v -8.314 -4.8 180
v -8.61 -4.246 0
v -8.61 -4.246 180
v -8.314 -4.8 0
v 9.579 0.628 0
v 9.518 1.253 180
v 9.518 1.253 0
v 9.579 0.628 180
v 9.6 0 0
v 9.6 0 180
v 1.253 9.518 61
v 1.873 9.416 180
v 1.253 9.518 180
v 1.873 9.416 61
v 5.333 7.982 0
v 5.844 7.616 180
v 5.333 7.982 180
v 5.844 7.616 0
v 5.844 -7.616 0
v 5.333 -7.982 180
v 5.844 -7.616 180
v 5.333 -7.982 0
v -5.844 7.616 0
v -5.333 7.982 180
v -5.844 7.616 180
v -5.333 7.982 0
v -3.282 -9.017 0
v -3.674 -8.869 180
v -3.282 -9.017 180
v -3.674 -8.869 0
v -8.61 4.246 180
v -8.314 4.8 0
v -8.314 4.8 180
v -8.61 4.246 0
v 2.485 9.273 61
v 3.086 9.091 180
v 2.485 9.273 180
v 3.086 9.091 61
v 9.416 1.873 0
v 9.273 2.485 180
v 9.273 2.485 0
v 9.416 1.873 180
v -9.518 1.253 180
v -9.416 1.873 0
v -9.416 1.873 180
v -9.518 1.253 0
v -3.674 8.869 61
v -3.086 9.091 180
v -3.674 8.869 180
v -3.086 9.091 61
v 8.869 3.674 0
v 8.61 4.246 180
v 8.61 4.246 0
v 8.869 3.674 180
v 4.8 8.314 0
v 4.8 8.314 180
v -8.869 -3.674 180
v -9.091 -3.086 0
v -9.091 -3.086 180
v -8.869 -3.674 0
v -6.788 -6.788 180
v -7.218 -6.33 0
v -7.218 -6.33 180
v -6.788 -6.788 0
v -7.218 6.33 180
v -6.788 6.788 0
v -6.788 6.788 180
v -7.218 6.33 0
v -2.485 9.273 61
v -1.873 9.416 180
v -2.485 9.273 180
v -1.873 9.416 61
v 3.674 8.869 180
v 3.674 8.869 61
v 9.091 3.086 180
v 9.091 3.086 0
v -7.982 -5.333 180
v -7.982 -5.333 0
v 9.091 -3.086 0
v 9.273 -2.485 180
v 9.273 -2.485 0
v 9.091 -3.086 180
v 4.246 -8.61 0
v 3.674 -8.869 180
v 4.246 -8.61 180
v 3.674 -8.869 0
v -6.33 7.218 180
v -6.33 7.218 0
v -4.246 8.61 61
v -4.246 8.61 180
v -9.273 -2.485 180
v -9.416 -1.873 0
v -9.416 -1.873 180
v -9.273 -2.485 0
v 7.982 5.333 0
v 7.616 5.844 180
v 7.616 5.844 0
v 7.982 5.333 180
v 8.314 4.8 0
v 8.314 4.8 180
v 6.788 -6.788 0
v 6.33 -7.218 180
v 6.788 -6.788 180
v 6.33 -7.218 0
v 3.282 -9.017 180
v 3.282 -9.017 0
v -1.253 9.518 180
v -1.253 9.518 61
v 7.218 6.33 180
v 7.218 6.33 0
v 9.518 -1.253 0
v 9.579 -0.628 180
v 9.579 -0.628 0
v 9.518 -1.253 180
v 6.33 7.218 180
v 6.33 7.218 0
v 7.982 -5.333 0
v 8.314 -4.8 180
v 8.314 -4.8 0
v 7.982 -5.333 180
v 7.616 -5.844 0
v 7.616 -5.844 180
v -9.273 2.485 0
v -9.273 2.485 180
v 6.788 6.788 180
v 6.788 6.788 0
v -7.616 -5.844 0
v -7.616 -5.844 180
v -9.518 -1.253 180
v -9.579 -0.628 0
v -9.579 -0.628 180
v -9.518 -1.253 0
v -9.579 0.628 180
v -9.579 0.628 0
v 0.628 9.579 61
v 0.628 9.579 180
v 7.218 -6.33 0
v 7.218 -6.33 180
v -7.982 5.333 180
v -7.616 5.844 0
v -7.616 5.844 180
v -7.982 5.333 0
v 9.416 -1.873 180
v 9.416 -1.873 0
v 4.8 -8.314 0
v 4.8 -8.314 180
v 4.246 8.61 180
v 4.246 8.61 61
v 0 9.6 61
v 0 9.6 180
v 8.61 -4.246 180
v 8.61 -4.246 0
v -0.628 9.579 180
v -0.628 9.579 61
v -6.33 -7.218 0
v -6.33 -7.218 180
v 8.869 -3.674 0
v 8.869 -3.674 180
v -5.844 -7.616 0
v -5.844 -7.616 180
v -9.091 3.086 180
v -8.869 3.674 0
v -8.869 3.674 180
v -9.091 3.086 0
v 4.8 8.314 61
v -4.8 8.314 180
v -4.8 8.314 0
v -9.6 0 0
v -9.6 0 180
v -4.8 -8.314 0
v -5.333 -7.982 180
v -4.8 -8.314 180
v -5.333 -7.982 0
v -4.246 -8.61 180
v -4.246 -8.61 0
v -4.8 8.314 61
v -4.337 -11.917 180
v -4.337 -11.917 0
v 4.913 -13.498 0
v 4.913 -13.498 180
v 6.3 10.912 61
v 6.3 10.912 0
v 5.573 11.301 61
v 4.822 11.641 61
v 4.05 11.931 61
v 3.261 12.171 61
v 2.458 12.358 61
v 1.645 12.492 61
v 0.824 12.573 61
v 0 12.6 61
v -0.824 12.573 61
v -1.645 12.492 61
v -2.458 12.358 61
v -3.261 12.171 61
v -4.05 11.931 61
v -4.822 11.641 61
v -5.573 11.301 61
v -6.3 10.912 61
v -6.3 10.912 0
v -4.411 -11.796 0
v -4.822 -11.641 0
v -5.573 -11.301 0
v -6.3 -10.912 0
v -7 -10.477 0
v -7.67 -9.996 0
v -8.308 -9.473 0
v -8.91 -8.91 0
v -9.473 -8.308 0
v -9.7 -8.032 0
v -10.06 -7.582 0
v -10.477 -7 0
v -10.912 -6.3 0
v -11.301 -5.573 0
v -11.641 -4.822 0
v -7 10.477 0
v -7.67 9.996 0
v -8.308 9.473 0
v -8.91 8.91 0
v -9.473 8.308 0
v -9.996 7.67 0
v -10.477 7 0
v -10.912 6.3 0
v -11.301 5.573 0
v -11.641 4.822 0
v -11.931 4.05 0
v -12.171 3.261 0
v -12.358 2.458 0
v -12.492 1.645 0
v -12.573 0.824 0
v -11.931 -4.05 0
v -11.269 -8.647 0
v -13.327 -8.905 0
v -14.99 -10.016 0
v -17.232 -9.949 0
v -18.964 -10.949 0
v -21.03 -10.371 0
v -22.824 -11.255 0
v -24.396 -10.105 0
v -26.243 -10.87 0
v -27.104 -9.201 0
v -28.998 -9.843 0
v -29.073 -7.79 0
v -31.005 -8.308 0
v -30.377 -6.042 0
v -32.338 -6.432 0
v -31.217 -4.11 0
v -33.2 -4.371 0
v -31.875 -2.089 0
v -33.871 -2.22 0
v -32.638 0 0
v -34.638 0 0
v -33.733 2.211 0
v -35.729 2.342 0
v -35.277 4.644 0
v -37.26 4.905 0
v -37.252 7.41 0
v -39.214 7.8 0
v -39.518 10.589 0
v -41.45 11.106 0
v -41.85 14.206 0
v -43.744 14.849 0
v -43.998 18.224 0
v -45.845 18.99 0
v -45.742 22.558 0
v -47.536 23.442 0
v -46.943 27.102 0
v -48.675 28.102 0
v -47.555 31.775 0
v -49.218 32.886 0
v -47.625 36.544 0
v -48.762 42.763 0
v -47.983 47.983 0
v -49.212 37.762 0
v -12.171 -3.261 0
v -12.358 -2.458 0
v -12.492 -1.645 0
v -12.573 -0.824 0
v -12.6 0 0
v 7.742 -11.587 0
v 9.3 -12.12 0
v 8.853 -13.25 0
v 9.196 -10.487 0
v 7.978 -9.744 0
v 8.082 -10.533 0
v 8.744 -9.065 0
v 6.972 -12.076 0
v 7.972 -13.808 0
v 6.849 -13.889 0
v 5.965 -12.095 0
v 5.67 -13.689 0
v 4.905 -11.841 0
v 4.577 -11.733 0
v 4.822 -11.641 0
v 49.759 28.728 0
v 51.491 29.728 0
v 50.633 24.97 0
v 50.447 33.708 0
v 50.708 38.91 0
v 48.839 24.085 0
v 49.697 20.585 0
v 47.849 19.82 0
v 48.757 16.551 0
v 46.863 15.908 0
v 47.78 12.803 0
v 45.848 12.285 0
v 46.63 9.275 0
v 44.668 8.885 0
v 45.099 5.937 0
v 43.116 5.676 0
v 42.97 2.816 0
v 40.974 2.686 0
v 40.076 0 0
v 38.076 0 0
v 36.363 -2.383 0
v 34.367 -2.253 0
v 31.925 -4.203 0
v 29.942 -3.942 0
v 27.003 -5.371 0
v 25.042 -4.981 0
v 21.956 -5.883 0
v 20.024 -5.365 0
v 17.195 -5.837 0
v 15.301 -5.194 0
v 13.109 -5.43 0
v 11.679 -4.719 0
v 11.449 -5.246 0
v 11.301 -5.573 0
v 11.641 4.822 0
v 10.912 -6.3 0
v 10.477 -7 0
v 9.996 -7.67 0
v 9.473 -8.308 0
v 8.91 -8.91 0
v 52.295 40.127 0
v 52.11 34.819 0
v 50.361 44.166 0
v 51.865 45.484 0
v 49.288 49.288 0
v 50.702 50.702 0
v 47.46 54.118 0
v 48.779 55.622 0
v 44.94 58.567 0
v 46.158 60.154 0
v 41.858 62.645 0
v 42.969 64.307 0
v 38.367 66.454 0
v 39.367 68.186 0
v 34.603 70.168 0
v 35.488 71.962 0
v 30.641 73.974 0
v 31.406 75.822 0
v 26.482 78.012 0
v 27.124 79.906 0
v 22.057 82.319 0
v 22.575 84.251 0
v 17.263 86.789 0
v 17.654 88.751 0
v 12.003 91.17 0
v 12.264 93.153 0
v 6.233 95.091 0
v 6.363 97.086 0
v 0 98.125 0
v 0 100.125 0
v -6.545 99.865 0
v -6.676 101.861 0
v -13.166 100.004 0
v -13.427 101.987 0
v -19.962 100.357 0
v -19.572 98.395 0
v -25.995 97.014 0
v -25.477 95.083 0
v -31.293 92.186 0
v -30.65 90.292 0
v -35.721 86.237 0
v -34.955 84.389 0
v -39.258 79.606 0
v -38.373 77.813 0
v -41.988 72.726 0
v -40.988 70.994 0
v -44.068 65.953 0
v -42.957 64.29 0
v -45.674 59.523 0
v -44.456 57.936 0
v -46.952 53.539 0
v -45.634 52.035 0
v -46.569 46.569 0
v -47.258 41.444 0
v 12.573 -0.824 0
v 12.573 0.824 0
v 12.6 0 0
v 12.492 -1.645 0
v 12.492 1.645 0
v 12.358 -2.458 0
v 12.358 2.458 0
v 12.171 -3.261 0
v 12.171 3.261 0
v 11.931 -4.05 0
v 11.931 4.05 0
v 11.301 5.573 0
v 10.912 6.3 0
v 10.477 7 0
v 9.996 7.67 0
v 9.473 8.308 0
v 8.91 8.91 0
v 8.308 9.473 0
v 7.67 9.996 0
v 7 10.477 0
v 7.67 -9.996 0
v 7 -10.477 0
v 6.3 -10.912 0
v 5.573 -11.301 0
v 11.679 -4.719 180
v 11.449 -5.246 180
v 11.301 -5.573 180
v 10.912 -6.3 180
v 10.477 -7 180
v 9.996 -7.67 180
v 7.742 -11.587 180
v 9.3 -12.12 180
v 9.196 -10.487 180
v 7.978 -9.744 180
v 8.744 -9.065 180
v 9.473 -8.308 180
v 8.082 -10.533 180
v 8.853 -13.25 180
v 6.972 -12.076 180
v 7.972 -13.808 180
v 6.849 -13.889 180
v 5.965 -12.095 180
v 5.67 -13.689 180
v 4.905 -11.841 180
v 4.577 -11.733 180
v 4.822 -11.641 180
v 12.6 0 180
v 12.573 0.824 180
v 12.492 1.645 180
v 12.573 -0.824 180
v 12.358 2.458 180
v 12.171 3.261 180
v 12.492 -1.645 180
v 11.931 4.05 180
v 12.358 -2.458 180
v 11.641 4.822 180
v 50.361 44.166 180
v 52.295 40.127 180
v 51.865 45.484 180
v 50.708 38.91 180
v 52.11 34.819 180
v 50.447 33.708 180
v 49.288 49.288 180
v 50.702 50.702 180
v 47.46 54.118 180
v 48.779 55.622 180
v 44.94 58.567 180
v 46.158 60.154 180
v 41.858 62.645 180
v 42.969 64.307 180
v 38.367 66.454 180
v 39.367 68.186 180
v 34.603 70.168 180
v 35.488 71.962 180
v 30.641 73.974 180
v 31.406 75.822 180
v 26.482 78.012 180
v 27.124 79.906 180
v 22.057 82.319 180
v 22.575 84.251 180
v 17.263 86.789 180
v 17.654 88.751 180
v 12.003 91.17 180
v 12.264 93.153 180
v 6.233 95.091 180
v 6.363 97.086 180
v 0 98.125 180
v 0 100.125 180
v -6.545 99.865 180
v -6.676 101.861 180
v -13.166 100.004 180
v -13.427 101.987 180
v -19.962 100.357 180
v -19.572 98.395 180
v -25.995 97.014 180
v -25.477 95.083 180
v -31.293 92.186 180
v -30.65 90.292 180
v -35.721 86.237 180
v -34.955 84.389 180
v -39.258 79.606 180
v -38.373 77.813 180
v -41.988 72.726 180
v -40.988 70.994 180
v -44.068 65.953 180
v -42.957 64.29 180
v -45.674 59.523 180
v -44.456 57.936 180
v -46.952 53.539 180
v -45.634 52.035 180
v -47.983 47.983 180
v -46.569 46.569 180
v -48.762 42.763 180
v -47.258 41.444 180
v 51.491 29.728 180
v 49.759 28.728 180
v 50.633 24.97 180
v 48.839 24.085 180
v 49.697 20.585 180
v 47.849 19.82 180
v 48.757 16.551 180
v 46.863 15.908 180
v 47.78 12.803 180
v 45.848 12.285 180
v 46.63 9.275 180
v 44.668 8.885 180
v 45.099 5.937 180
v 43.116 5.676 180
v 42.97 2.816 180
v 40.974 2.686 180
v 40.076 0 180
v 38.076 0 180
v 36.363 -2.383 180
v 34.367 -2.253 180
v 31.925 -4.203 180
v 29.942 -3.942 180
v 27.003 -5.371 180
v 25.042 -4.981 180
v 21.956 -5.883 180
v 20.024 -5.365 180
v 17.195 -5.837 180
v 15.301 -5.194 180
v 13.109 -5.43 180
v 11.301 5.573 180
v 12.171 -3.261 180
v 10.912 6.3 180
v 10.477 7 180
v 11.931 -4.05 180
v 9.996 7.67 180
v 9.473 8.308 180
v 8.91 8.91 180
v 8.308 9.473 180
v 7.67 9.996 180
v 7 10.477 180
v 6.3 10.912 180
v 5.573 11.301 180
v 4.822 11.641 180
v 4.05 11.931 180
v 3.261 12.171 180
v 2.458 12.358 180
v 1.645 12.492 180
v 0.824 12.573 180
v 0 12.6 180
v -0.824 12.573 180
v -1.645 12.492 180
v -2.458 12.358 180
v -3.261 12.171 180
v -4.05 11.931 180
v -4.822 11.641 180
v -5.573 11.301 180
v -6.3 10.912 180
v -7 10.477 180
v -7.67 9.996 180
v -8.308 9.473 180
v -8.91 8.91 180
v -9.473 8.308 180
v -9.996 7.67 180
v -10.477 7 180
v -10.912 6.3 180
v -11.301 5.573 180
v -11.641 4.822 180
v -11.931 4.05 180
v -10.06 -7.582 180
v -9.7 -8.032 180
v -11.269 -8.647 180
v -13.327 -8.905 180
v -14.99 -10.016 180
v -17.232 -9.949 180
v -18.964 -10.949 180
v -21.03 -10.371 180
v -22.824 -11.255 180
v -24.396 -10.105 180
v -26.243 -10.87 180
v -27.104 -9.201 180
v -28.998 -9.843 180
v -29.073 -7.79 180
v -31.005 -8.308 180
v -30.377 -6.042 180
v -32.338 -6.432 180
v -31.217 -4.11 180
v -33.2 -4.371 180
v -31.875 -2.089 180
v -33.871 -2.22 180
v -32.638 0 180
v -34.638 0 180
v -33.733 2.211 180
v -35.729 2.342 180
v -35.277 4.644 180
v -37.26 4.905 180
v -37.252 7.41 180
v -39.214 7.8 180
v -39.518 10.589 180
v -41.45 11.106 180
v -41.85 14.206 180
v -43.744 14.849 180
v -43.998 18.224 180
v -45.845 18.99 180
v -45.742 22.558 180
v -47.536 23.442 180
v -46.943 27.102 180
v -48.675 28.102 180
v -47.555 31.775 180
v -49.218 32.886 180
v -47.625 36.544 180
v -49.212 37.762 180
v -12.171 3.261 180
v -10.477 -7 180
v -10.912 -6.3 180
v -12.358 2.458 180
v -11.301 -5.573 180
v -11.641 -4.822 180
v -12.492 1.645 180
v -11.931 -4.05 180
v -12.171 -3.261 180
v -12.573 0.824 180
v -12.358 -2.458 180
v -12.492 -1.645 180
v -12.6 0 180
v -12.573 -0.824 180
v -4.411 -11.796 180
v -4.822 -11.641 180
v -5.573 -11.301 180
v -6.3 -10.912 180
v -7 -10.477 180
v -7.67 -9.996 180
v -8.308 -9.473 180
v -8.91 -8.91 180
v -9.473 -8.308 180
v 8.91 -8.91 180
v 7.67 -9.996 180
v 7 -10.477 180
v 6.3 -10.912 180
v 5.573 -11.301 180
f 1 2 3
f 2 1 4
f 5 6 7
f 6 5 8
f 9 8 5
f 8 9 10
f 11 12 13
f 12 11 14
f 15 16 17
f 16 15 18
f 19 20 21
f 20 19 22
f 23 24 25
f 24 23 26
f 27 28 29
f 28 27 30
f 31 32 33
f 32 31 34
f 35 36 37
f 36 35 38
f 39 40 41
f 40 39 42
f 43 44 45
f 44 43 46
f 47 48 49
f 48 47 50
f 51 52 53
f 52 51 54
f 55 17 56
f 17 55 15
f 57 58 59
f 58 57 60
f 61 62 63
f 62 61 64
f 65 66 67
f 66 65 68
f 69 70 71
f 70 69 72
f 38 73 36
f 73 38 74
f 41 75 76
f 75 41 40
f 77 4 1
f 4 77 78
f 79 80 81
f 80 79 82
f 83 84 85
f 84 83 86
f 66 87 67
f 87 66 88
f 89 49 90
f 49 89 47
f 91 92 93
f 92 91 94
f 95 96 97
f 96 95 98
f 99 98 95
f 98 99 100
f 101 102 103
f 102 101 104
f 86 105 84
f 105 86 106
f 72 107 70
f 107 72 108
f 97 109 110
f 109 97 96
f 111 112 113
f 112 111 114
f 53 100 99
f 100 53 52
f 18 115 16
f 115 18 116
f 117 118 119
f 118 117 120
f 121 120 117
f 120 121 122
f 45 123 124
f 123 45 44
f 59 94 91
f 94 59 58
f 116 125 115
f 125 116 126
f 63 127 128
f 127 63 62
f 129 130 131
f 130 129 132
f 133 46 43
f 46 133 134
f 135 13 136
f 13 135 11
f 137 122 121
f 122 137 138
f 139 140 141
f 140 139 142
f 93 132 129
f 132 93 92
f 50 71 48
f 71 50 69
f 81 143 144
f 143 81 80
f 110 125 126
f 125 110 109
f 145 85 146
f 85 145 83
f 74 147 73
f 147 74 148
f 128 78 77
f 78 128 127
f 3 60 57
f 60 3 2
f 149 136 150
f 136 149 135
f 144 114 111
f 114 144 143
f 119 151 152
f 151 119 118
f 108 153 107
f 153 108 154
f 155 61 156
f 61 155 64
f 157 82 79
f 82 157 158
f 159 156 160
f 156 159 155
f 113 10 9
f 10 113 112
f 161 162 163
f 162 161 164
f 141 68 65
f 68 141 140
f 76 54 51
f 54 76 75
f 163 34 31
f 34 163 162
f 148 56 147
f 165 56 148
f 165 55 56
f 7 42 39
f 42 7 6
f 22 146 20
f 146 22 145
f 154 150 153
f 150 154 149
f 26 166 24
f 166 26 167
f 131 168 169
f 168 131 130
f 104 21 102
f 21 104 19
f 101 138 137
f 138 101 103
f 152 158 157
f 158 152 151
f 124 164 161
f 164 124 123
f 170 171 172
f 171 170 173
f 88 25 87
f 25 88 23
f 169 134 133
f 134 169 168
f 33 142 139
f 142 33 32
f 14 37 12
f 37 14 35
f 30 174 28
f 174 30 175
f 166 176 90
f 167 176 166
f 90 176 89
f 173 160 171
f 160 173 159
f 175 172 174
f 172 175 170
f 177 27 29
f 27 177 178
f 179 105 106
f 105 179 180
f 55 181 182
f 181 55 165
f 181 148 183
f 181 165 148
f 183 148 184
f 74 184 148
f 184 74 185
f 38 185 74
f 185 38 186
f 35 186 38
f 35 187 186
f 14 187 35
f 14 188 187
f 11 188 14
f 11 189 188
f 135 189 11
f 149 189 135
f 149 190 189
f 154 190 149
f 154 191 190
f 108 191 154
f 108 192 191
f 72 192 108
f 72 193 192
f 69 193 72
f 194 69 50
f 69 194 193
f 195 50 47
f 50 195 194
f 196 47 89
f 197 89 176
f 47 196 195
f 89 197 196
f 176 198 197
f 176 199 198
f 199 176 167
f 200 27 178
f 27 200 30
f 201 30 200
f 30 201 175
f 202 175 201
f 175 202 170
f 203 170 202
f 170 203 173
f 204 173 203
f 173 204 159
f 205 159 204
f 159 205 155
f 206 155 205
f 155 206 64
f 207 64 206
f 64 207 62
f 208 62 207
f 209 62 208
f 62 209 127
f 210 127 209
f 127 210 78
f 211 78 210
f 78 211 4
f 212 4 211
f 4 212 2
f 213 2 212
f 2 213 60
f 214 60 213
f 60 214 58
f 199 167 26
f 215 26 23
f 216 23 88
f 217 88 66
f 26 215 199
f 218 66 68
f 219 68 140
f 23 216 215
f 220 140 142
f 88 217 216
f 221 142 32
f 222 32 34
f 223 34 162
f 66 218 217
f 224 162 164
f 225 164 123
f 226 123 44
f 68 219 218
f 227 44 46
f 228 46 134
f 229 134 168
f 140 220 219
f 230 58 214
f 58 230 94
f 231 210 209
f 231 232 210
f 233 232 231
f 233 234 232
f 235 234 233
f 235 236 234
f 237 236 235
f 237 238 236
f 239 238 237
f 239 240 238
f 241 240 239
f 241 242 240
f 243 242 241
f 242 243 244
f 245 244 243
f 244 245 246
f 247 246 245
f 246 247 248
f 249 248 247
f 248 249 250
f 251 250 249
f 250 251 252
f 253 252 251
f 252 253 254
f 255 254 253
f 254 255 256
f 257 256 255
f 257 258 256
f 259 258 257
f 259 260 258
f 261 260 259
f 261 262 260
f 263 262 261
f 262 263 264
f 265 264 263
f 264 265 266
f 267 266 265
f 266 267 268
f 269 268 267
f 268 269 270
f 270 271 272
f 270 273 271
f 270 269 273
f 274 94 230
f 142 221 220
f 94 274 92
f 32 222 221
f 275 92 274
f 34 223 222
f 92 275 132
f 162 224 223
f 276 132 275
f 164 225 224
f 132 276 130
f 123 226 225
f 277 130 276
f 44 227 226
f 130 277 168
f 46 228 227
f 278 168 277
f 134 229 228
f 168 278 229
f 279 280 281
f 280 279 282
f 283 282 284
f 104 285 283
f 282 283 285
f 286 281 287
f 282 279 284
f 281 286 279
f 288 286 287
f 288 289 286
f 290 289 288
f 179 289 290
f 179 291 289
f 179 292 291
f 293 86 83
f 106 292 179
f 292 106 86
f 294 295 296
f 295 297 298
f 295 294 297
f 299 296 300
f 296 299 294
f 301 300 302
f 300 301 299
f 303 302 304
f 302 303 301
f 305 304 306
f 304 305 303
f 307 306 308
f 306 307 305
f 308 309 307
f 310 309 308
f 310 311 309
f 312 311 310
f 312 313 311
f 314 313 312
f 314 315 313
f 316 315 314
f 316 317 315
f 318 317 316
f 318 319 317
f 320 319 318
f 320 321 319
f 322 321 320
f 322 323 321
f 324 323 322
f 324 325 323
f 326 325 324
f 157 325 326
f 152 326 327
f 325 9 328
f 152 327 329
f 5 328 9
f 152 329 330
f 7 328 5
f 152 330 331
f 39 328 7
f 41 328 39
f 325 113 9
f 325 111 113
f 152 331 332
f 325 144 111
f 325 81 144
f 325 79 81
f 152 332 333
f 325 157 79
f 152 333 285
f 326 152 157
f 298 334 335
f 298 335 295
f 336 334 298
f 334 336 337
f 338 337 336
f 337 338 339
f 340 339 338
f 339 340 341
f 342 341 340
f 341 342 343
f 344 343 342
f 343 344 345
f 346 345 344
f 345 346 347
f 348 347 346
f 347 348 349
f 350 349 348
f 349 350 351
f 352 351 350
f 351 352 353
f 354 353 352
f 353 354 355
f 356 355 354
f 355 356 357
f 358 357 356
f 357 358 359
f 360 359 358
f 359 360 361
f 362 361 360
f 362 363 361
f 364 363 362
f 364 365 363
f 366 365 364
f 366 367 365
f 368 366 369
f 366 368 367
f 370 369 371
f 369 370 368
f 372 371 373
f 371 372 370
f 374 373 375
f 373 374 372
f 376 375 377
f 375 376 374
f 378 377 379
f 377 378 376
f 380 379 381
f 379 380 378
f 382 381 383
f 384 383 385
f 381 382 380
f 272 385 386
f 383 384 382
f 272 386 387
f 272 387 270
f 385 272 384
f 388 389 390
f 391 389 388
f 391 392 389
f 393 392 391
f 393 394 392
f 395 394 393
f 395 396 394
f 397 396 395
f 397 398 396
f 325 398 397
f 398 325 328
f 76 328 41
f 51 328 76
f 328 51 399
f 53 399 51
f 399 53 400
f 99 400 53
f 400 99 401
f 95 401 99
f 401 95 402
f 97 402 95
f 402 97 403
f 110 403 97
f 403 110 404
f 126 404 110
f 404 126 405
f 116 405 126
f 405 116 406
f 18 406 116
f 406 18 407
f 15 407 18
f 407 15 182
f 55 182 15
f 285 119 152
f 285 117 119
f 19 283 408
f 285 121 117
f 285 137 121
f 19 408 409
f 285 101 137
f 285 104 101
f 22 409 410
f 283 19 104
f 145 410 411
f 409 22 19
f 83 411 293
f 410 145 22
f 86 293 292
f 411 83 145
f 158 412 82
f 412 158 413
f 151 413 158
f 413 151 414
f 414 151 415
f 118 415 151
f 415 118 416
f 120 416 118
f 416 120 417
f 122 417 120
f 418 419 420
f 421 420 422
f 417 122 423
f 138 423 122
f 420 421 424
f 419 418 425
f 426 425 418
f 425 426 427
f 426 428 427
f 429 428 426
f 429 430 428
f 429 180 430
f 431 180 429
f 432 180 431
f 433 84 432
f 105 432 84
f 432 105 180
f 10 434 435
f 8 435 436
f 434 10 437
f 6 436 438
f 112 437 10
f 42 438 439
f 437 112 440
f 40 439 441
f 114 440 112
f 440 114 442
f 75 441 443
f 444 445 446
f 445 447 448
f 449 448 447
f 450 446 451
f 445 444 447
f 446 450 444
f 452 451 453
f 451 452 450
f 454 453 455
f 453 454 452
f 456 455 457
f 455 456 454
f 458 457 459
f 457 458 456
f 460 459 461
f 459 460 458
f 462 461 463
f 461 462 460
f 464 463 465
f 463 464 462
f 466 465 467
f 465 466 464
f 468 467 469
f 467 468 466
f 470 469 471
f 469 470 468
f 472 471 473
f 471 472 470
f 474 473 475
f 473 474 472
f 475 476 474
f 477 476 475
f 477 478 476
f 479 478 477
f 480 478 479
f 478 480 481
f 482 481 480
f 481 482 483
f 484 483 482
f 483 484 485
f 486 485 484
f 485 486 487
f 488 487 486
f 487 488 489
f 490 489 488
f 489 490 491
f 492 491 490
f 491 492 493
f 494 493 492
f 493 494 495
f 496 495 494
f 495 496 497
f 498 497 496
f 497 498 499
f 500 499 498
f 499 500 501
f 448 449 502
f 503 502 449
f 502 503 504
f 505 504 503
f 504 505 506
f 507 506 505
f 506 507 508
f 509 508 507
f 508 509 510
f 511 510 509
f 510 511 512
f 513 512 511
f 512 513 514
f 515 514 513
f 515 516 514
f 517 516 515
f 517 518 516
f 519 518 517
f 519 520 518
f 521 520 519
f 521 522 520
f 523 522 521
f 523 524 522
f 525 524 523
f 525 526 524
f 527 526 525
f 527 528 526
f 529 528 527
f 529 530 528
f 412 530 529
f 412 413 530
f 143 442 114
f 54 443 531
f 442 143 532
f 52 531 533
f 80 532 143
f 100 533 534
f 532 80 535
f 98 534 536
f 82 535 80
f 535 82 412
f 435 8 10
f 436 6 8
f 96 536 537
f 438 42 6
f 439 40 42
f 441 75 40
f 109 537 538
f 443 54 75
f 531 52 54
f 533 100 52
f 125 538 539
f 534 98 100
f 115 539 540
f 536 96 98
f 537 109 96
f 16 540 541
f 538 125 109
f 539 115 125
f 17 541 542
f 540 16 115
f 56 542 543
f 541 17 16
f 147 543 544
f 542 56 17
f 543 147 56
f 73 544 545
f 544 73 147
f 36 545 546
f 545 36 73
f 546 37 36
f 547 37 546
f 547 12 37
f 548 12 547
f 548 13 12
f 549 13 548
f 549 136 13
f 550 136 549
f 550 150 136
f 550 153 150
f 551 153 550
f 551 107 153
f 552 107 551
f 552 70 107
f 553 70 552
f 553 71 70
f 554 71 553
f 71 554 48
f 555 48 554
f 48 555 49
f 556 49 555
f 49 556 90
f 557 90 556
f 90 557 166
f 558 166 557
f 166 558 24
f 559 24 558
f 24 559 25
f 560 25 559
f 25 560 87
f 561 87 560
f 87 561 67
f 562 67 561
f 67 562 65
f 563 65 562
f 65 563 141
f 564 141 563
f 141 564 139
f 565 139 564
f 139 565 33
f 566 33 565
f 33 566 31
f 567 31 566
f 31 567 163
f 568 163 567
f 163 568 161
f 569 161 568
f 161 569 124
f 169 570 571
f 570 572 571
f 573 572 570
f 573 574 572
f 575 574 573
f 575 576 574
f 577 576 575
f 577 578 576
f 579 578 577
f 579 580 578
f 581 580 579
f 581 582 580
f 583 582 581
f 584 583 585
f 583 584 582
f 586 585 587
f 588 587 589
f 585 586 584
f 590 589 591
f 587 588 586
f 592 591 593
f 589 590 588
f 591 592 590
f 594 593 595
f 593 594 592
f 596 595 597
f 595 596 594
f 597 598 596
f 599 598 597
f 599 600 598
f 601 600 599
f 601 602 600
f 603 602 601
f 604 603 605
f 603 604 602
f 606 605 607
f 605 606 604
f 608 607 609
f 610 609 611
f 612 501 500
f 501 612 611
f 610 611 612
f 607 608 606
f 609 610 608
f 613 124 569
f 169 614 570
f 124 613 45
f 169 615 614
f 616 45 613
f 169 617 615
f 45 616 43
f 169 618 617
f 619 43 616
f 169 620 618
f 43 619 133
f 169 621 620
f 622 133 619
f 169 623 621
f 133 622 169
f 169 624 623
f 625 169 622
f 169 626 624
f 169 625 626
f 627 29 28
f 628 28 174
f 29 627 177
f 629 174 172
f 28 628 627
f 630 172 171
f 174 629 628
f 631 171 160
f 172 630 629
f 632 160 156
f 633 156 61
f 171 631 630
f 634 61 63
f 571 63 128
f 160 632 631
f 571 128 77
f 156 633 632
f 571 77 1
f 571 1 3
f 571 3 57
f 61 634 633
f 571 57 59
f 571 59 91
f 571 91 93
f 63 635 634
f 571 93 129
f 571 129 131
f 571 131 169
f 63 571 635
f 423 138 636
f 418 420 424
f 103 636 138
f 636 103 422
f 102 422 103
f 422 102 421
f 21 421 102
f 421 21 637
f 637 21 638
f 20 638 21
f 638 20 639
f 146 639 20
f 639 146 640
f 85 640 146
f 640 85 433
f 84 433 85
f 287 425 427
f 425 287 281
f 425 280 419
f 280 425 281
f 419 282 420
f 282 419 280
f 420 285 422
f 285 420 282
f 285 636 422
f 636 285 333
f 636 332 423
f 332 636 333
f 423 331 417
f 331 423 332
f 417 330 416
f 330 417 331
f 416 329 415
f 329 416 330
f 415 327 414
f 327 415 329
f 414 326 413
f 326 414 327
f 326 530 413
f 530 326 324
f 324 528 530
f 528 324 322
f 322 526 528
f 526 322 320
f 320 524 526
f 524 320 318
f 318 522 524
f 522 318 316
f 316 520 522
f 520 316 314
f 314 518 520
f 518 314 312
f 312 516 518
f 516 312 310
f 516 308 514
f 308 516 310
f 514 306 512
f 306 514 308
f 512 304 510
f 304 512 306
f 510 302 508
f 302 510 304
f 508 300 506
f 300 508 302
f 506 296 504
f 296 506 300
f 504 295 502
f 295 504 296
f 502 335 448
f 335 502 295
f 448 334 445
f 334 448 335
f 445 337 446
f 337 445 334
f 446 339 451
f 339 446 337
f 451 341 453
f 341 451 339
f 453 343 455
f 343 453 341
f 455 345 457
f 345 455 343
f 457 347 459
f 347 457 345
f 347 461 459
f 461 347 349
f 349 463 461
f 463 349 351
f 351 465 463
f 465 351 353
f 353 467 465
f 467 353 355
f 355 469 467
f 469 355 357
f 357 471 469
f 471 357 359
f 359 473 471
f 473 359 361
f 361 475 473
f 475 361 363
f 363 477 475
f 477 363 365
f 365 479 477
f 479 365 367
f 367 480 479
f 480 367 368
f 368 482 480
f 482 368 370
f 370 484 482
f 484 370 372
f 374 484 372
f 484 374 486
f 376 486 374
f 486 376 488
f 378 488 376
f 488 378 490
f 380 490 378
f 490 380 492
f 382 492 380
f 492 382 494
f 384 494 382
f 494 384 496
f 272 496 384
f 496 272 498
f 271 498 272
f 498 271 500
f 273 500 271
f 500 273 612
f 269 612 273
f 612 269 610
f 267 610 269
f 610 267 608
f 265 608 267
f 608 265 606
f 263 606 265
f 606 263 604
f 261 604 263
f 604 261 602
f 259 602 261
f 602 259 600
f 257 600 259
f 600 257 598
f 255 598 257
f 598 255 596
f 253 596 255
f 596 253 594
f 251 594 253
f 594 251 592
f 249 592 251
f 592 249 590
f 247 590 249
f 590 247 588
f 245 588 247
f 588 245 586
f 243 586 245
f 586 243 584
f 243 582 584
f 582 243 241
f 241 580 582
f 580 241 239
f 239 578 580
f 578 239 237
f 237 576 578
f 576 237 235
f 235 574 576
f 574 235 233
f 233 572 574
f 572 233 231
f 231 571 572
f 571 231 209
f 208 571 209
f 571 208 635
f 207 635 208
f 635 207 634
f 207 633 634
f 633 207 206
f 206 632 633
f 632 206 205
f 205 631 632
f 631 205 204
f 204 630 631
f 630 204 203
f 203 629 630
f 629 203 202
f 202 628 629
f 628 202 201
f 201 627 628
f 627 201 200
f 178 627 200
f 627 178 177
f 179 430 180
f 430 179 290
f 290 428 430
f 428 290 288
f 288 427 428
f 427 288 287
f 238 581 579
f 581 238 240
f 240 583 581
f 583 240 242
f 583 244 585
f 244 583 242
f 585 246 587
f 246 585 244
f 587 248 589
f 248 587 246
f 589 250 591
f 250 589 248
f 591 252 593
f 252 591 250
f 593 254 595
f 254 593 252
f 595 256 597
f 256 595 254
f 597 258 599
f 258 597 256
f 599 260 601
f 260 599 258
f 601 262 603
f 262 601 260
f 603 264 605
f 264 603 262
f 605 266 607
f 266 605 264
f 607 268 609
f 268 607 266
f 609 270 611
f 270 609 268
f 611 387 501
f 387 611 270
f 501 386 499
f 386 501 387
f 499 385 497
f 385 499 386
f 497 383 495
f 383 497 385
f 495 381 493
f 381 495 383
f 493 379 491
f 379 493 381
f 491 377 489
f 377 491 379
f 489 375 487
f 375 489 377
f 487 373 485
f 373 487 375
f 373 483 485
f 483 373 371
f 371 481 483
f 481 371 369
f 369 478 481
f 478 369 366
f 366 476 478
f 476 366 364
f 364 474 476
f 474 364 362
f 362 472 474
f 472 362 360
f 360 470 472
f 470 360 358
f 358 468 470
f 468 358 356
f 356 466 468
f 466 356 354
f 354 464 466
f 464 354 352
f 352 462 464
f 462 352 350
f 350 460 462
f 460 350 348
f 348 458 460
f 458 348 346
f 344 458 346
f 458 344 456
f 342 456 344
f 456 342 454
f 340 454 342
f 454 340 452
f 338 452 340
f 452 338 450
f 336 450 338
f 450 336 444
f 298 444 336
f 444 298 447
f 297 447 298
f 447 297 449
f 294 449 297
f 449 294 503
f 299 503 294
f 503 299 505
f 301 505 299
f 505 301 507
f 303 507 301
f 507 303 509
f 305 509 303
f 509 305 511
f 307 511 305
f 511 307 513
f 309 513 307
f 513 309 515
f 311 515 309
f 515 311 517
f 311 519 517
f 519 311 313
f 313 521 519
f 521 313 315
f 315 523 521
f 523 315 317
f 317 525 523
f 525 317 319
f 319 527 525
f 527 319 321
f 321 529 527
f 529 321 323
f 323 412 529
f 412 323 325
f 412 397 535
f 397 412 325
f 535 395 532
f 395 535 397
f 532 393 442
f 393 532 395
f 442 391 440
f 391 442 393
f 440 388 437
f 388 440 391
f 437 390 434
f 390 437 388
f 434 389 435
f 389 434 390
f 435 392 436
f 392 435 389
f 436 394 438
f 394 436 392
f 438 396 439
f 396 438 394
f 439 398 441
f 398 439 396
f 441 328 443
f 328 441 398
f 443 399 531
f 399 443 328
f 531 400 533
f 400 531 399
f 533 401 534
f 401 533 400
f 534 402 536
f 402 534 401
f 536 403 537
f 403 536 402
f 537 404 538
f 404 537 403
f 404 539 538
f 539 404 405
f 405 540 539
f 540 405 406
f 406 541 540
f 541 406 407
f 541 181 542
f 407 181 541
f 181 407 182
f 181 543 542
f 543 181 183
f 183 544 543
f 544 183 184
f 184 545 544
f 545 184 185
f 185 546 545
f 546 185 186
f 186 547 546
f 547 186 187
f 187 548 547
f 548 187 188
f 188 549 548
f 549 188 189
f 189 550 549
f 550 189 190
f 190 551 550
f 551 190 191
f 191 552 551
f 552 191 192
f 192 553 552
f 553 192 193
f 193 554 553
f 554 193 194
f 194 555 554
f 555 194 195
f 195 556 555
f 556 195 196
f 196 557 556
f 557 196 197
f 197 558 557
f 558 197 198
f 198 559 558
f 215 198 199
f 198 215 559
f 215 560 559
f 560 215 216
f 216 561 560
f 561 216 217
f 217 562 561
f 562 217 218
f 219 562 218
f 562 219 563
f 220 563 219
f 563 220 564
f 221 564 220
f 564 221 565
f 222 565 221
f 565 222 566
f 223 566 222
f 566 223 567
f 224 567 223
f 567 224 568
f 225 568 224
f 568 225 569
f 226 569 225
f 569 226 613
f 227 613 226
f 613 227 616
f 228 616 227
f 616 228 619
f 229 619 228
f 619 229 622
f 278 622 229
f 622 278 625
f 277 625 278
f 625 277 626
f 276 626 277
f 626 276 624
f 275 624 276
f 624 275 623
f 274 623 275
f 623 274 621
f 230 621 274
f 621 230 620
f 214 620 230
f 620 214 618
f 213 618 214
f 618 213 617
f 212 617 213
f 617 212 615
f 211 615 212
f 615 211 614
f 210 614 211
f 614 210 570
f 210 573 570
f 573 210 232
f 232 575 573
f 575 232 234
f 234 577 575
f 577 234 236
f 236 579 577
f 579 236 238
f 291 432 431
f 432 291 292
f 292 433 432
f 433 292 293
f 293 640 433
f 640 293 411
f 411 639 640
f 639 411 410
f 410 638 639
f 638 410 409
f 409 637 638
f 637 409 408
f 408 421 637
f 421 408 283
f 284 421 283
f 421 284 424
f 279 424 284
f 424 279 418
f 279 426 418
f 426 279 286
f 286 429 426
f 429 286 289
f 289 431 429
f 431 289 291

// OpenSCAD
// Lampenschirm für Stehlampe – organischer, wellenförmiger Querschnitt
// mit Klemmkragen, der in die Form integriert ist (keine D-Form mehr)
// Alle Maße in Millimetern (Regel: units-mm)
//
// Kontext: context/printer.md, context/tolerances.md und context/materials.md
// waren zum Zeitpunkt der Modellierung leer (siehe Regel: context-first).
// Annahmen aus dem Design-Dialog (siehe auch 001/002):
//   - Baubett >= 200mm Z-Höhe vorhanden -> Schirm wird als ein Teil,
//     stehend, in voller Höhe gedruckt.
//   - Klemmkragen als offener Federclip (C-Ring): Innendurchmesser 0.8mm
//     unter Stangendurchmesser (19.2mm ID auf 20mm Stange) für Vorspannung.
//   - E14-Fassung wird separat an der Stange montiert.
//
// Änderungen gegenüber 007 (Nutzer-Feedback: kleine hässliche Auswüchse an
// der Kontur + auf der rechten Seite ist die Verbindung zur Klemme wieder
// weg):
//   - Ursache: die Fourier-Basis aus 007 (a1=40.5) stieg von der Rückseite
//     aus zu steil an. Schon ab ca. 10-15° neben der Rückseite lag der
//     Basisradius allein schon über dem für die Verbindung nötigen Maximum -
//     die dort noch nicht vollständig gedämpfte Welle konnte die Kontur an
//     manchen Winkeln (z.B. rechts) wieder über diese Grenze drücken, an
//     anderen (z.B. links) durch Zufall nicht. Daraus die sichtbaren
//     Sprünge/Auswüchse UND die fehlende Verbindung auf der rechten Seite.
//   - Fix: Die Basisform nutzt jetzt eine Potenzfunktion (u^2 statt reinem
//     Kosinus) statt einer Fourier-Reihe. Dadurch bleibt der Radius rund um
//     die Rückseite über einen deutlich breiteren Winkelbereich (~±25-30°)
//     nahezu konstant bei back_r, bevor er Richtung Front ansteigt - viel
//     mehr Sicherheitsabstand für die Welle. Die Welle ist zusätzlich
//     schwächer (6mm/3mm statt 9mm/5mm) und wird über eine breitere
//     Hüllkurve nahe der Rückseite gedämpft. Ein zusätzlicher harter
//     Sicherheits-Deckel (max_neck_r) innerhalb eines engen Winkelbereichs
//     verhindert garantiert jedes Überschreiten, egal welche Wellenphase an
//     welchem Winkel zusammentrifft.

// ---- Parameter ----
shade_height = 180;   // Gesamthöhe des Schirms
wall_t       = 2;     // Wandstärke Schirm (durchgehend, auch am Klemmkragen-Übergang)

rod_d      = 20;                 // Durchmesser der Metallstange
rod_r      = rod_d / 2;
clip_id    = 19.2;               // Innendurchmesser Klemmkragen (Vorspannung, ~0.8mm Untermaß)
clip_r_in  = clip_id / 2;
clip_wall  = 3;                  // Wandstärke Klemmkragen (dicker als Schirmwand, für Klemmkraft)
clip_r_out = clip_r_in + clip_wall;
clip_gap_deg = 40;               // Öffnungswinkel des C-Rings (Montagespalt, zeigt nach -Y)

socket_slot_deg    = 60;              // Öffnungswinkel des Fassungs-Schlitzes (Innenseite, +Y) - Annahme
socket_slot_height = shade_height / 3; // unteres Drittel der Klemme ist auf der Innenseite offen

// Organische Grundform: Potenzfunktion statt Fourier-Reihe, damit die
// Rückseite (θ=270°) über einen breiten Winkelbereich flach bleibt, statt
// steil anzusteigen.
back_r  = 13;     // Zielradius an der Rückseite (θ=270°) - eng am Klemmkragen
front_r = 95;      // Zielradius an der Front (θ=90°)
flatten_power = 2; // höher = flacherer/breiterer "Hals" um die Klemme, aber schmalere Seiten

// Wellen-Überlagerung für den organischen/wellenförmigen Look (Front/Seiten)
wave_amp1 = 6;   wave_freq1 = 4;  wave_phase1 = 40;
wave_amp2 = 3;   wave_freq2 = 7;  wave_phase2 = 115;
wave_fade_width = 55;   // Welle erreicht erst ab diesem Winkelabstand von der Rückseite volle Stärke

// Harter Sicherheits-Deckel: garantiert, dass die Kontur nahe der Rückseite
// den Klemmkragen nie verfehlt, unabhängig von der Wellenphase
neck_guard_width = 20;                     // Winkelbereich, in dem der Deckel aktiv ist
max_neck_r = clip_r_out + wall_t - 0.3;    // = 14.3mm, garantiert Überlappung mit Sicherheitsabstand
min_r      = clip_r_out - 1;               // globale Untergrenze (Reserve, verhindert Radius <= 0 / Bohrung)

cut_far = 300;   // "unendlich" großer Radius für Schnitte, die garantiert bis nach außen durchbrechen sollen

$fn = 96;

// Winkelabstand zwischen theta und center (0-180°, robust über den 0°/360°-Übergang)
function angle_diff(theta, center) =
    let(d = abs(theta - center))
    (d > 180) ? 360 - d : d;

// Hüllkurve 0 (direkt an der Rückseite) bis 1 (ab wave_fade_width Grad Abstand)
function wave_envelope(theta) =
    let(d = angle_diff(theta, 270))
    (d >= wave_fade_width) ? 1 : (1 - cos(180 * d / wave_fade_width)) / 2;

// Radius der organischen Kontur in Abhängigkeit vom Winkel θ (Grad)
function organic_r(theta) =
    let(phi = theta - 90)
    let(u = (1 + cos(phi)) / 2)   // 0 an der Rückseite (θ=270°), 1 an der Front (θ=90°)
    let(base = back_r + (front_r - back_r) * pow(u, flatten_power))
    let(raw_wave = wave_amp1 * sin(wave_freq1 * theta + wave_phase1)
                 + wave_amp2 * sin(wave_freq2 * theta + wave_phase2))
    let(wave = raw_wave * wave_envelope(theta))
    let(r_free = base + wave)
    let(d = angle_diff(theta, 270))
    let(r_guarded = (d < neck_guard_width) ? min(r_free, max_neck_r) : r_free)
    max(r_guarded, min_r);

// Geschlossenes 2D-Profil der organischen Kontur, um shrink (mm) nach innen
// verkleinert (shrink=0 -> Außenkontur, shrink=wall_t -> Innenkontur).
// Direkte Radius-Berechnung statt offset() - robust bei welliger Kontur.
module organic_outline(shrink = 0) {
    step = 360 / $fn;
    polygon(points = [
        for (t = [0 : step : 360 - step])
            [(organic_r(t) - shrink) * cos(t), (organic_r(t) - shrink) * sin(t)]
    ]);
}

// Keilförmiger 2D-Ausschnitt, zentriert auf Winkel 0
module pie_wedge_2d(radius, angle_deg) {
    a = angle_deg / 2;
    polygon(points = [
        [0, 0],
        [radius * cos(a), radius * sin(a)],
        [radius * cos(-a), radius * sin(-a)]
    ]);
}

// Voller Klemmkragen-Rohling (Bohrung/Spalt werden erst in 3D herausgeschnitten).
// Überlappt an der Rückseite direkt mit der Innenkontur der Schirmwand.
module collar_disk_2d() {
    circle(r = clip_r_out);
}

// 2D-Profil der Wand: durchgehend wall_t dick, plus Klemmkragen-Rohling
module shell_with_boss_2d() {
    union() {
        difference() {
            organic_outline(0);
            organic_outline(wall_t);
        }
        collar_disk_2d();
    }
}

module organic_shell() {
    linear_extrude(height = shade_height)
        shell_with_boss_2d();
}

// Radialer Schlitz von z0 bis z1, in Richtung facing_deg ausgerichtet
module radial_slot(radius, angle_deg, facing_deg, z0, z1) {
    translate([0, 0, z0])
        rotate([0, 0, facing_deg])
            linear_extrude(z1 - z0)
                pie_wedge_2d(radius, angle_deg);
}

// Alle Ausschnitte für die Klemme: durchgehende Stangenbohrung + Montagespalt
// (volle Höhe, -Y, bricht bis zur echten Außenwand durch, damit seitlich
// eingeclipst werden kann) + Fassungs-Schlitz (unteres Drittel, +Y, öffnet
// nur bis in den ohnehin dort schon hohlen Innenraum)
module clamp_cutouts() {
    union() {
        translate([0, 0, -1])
            cylinder(r = clip_r_in, h = shade_height + 2);

        radial_slot(cut_far, clip_gap_deg, 270, -1, shade_height + 1);

        radial_slot(clip_r_out + 5, socket_slot_deg, 90, -1, socket_slot_height + 1);
    }
}

// render() erzwingt die vollständige (exakte) Boolesche Berechnung statt der
// schnellen OpenCSG-Live-Vorschau, damit die Klemme auch in der OpenSCAD-
// Vorschau (F5) korrekt dargestellt wird.
render(convexity = 10)
    difference() {
        organic_shell();
        clamp_cutouts();
    }
